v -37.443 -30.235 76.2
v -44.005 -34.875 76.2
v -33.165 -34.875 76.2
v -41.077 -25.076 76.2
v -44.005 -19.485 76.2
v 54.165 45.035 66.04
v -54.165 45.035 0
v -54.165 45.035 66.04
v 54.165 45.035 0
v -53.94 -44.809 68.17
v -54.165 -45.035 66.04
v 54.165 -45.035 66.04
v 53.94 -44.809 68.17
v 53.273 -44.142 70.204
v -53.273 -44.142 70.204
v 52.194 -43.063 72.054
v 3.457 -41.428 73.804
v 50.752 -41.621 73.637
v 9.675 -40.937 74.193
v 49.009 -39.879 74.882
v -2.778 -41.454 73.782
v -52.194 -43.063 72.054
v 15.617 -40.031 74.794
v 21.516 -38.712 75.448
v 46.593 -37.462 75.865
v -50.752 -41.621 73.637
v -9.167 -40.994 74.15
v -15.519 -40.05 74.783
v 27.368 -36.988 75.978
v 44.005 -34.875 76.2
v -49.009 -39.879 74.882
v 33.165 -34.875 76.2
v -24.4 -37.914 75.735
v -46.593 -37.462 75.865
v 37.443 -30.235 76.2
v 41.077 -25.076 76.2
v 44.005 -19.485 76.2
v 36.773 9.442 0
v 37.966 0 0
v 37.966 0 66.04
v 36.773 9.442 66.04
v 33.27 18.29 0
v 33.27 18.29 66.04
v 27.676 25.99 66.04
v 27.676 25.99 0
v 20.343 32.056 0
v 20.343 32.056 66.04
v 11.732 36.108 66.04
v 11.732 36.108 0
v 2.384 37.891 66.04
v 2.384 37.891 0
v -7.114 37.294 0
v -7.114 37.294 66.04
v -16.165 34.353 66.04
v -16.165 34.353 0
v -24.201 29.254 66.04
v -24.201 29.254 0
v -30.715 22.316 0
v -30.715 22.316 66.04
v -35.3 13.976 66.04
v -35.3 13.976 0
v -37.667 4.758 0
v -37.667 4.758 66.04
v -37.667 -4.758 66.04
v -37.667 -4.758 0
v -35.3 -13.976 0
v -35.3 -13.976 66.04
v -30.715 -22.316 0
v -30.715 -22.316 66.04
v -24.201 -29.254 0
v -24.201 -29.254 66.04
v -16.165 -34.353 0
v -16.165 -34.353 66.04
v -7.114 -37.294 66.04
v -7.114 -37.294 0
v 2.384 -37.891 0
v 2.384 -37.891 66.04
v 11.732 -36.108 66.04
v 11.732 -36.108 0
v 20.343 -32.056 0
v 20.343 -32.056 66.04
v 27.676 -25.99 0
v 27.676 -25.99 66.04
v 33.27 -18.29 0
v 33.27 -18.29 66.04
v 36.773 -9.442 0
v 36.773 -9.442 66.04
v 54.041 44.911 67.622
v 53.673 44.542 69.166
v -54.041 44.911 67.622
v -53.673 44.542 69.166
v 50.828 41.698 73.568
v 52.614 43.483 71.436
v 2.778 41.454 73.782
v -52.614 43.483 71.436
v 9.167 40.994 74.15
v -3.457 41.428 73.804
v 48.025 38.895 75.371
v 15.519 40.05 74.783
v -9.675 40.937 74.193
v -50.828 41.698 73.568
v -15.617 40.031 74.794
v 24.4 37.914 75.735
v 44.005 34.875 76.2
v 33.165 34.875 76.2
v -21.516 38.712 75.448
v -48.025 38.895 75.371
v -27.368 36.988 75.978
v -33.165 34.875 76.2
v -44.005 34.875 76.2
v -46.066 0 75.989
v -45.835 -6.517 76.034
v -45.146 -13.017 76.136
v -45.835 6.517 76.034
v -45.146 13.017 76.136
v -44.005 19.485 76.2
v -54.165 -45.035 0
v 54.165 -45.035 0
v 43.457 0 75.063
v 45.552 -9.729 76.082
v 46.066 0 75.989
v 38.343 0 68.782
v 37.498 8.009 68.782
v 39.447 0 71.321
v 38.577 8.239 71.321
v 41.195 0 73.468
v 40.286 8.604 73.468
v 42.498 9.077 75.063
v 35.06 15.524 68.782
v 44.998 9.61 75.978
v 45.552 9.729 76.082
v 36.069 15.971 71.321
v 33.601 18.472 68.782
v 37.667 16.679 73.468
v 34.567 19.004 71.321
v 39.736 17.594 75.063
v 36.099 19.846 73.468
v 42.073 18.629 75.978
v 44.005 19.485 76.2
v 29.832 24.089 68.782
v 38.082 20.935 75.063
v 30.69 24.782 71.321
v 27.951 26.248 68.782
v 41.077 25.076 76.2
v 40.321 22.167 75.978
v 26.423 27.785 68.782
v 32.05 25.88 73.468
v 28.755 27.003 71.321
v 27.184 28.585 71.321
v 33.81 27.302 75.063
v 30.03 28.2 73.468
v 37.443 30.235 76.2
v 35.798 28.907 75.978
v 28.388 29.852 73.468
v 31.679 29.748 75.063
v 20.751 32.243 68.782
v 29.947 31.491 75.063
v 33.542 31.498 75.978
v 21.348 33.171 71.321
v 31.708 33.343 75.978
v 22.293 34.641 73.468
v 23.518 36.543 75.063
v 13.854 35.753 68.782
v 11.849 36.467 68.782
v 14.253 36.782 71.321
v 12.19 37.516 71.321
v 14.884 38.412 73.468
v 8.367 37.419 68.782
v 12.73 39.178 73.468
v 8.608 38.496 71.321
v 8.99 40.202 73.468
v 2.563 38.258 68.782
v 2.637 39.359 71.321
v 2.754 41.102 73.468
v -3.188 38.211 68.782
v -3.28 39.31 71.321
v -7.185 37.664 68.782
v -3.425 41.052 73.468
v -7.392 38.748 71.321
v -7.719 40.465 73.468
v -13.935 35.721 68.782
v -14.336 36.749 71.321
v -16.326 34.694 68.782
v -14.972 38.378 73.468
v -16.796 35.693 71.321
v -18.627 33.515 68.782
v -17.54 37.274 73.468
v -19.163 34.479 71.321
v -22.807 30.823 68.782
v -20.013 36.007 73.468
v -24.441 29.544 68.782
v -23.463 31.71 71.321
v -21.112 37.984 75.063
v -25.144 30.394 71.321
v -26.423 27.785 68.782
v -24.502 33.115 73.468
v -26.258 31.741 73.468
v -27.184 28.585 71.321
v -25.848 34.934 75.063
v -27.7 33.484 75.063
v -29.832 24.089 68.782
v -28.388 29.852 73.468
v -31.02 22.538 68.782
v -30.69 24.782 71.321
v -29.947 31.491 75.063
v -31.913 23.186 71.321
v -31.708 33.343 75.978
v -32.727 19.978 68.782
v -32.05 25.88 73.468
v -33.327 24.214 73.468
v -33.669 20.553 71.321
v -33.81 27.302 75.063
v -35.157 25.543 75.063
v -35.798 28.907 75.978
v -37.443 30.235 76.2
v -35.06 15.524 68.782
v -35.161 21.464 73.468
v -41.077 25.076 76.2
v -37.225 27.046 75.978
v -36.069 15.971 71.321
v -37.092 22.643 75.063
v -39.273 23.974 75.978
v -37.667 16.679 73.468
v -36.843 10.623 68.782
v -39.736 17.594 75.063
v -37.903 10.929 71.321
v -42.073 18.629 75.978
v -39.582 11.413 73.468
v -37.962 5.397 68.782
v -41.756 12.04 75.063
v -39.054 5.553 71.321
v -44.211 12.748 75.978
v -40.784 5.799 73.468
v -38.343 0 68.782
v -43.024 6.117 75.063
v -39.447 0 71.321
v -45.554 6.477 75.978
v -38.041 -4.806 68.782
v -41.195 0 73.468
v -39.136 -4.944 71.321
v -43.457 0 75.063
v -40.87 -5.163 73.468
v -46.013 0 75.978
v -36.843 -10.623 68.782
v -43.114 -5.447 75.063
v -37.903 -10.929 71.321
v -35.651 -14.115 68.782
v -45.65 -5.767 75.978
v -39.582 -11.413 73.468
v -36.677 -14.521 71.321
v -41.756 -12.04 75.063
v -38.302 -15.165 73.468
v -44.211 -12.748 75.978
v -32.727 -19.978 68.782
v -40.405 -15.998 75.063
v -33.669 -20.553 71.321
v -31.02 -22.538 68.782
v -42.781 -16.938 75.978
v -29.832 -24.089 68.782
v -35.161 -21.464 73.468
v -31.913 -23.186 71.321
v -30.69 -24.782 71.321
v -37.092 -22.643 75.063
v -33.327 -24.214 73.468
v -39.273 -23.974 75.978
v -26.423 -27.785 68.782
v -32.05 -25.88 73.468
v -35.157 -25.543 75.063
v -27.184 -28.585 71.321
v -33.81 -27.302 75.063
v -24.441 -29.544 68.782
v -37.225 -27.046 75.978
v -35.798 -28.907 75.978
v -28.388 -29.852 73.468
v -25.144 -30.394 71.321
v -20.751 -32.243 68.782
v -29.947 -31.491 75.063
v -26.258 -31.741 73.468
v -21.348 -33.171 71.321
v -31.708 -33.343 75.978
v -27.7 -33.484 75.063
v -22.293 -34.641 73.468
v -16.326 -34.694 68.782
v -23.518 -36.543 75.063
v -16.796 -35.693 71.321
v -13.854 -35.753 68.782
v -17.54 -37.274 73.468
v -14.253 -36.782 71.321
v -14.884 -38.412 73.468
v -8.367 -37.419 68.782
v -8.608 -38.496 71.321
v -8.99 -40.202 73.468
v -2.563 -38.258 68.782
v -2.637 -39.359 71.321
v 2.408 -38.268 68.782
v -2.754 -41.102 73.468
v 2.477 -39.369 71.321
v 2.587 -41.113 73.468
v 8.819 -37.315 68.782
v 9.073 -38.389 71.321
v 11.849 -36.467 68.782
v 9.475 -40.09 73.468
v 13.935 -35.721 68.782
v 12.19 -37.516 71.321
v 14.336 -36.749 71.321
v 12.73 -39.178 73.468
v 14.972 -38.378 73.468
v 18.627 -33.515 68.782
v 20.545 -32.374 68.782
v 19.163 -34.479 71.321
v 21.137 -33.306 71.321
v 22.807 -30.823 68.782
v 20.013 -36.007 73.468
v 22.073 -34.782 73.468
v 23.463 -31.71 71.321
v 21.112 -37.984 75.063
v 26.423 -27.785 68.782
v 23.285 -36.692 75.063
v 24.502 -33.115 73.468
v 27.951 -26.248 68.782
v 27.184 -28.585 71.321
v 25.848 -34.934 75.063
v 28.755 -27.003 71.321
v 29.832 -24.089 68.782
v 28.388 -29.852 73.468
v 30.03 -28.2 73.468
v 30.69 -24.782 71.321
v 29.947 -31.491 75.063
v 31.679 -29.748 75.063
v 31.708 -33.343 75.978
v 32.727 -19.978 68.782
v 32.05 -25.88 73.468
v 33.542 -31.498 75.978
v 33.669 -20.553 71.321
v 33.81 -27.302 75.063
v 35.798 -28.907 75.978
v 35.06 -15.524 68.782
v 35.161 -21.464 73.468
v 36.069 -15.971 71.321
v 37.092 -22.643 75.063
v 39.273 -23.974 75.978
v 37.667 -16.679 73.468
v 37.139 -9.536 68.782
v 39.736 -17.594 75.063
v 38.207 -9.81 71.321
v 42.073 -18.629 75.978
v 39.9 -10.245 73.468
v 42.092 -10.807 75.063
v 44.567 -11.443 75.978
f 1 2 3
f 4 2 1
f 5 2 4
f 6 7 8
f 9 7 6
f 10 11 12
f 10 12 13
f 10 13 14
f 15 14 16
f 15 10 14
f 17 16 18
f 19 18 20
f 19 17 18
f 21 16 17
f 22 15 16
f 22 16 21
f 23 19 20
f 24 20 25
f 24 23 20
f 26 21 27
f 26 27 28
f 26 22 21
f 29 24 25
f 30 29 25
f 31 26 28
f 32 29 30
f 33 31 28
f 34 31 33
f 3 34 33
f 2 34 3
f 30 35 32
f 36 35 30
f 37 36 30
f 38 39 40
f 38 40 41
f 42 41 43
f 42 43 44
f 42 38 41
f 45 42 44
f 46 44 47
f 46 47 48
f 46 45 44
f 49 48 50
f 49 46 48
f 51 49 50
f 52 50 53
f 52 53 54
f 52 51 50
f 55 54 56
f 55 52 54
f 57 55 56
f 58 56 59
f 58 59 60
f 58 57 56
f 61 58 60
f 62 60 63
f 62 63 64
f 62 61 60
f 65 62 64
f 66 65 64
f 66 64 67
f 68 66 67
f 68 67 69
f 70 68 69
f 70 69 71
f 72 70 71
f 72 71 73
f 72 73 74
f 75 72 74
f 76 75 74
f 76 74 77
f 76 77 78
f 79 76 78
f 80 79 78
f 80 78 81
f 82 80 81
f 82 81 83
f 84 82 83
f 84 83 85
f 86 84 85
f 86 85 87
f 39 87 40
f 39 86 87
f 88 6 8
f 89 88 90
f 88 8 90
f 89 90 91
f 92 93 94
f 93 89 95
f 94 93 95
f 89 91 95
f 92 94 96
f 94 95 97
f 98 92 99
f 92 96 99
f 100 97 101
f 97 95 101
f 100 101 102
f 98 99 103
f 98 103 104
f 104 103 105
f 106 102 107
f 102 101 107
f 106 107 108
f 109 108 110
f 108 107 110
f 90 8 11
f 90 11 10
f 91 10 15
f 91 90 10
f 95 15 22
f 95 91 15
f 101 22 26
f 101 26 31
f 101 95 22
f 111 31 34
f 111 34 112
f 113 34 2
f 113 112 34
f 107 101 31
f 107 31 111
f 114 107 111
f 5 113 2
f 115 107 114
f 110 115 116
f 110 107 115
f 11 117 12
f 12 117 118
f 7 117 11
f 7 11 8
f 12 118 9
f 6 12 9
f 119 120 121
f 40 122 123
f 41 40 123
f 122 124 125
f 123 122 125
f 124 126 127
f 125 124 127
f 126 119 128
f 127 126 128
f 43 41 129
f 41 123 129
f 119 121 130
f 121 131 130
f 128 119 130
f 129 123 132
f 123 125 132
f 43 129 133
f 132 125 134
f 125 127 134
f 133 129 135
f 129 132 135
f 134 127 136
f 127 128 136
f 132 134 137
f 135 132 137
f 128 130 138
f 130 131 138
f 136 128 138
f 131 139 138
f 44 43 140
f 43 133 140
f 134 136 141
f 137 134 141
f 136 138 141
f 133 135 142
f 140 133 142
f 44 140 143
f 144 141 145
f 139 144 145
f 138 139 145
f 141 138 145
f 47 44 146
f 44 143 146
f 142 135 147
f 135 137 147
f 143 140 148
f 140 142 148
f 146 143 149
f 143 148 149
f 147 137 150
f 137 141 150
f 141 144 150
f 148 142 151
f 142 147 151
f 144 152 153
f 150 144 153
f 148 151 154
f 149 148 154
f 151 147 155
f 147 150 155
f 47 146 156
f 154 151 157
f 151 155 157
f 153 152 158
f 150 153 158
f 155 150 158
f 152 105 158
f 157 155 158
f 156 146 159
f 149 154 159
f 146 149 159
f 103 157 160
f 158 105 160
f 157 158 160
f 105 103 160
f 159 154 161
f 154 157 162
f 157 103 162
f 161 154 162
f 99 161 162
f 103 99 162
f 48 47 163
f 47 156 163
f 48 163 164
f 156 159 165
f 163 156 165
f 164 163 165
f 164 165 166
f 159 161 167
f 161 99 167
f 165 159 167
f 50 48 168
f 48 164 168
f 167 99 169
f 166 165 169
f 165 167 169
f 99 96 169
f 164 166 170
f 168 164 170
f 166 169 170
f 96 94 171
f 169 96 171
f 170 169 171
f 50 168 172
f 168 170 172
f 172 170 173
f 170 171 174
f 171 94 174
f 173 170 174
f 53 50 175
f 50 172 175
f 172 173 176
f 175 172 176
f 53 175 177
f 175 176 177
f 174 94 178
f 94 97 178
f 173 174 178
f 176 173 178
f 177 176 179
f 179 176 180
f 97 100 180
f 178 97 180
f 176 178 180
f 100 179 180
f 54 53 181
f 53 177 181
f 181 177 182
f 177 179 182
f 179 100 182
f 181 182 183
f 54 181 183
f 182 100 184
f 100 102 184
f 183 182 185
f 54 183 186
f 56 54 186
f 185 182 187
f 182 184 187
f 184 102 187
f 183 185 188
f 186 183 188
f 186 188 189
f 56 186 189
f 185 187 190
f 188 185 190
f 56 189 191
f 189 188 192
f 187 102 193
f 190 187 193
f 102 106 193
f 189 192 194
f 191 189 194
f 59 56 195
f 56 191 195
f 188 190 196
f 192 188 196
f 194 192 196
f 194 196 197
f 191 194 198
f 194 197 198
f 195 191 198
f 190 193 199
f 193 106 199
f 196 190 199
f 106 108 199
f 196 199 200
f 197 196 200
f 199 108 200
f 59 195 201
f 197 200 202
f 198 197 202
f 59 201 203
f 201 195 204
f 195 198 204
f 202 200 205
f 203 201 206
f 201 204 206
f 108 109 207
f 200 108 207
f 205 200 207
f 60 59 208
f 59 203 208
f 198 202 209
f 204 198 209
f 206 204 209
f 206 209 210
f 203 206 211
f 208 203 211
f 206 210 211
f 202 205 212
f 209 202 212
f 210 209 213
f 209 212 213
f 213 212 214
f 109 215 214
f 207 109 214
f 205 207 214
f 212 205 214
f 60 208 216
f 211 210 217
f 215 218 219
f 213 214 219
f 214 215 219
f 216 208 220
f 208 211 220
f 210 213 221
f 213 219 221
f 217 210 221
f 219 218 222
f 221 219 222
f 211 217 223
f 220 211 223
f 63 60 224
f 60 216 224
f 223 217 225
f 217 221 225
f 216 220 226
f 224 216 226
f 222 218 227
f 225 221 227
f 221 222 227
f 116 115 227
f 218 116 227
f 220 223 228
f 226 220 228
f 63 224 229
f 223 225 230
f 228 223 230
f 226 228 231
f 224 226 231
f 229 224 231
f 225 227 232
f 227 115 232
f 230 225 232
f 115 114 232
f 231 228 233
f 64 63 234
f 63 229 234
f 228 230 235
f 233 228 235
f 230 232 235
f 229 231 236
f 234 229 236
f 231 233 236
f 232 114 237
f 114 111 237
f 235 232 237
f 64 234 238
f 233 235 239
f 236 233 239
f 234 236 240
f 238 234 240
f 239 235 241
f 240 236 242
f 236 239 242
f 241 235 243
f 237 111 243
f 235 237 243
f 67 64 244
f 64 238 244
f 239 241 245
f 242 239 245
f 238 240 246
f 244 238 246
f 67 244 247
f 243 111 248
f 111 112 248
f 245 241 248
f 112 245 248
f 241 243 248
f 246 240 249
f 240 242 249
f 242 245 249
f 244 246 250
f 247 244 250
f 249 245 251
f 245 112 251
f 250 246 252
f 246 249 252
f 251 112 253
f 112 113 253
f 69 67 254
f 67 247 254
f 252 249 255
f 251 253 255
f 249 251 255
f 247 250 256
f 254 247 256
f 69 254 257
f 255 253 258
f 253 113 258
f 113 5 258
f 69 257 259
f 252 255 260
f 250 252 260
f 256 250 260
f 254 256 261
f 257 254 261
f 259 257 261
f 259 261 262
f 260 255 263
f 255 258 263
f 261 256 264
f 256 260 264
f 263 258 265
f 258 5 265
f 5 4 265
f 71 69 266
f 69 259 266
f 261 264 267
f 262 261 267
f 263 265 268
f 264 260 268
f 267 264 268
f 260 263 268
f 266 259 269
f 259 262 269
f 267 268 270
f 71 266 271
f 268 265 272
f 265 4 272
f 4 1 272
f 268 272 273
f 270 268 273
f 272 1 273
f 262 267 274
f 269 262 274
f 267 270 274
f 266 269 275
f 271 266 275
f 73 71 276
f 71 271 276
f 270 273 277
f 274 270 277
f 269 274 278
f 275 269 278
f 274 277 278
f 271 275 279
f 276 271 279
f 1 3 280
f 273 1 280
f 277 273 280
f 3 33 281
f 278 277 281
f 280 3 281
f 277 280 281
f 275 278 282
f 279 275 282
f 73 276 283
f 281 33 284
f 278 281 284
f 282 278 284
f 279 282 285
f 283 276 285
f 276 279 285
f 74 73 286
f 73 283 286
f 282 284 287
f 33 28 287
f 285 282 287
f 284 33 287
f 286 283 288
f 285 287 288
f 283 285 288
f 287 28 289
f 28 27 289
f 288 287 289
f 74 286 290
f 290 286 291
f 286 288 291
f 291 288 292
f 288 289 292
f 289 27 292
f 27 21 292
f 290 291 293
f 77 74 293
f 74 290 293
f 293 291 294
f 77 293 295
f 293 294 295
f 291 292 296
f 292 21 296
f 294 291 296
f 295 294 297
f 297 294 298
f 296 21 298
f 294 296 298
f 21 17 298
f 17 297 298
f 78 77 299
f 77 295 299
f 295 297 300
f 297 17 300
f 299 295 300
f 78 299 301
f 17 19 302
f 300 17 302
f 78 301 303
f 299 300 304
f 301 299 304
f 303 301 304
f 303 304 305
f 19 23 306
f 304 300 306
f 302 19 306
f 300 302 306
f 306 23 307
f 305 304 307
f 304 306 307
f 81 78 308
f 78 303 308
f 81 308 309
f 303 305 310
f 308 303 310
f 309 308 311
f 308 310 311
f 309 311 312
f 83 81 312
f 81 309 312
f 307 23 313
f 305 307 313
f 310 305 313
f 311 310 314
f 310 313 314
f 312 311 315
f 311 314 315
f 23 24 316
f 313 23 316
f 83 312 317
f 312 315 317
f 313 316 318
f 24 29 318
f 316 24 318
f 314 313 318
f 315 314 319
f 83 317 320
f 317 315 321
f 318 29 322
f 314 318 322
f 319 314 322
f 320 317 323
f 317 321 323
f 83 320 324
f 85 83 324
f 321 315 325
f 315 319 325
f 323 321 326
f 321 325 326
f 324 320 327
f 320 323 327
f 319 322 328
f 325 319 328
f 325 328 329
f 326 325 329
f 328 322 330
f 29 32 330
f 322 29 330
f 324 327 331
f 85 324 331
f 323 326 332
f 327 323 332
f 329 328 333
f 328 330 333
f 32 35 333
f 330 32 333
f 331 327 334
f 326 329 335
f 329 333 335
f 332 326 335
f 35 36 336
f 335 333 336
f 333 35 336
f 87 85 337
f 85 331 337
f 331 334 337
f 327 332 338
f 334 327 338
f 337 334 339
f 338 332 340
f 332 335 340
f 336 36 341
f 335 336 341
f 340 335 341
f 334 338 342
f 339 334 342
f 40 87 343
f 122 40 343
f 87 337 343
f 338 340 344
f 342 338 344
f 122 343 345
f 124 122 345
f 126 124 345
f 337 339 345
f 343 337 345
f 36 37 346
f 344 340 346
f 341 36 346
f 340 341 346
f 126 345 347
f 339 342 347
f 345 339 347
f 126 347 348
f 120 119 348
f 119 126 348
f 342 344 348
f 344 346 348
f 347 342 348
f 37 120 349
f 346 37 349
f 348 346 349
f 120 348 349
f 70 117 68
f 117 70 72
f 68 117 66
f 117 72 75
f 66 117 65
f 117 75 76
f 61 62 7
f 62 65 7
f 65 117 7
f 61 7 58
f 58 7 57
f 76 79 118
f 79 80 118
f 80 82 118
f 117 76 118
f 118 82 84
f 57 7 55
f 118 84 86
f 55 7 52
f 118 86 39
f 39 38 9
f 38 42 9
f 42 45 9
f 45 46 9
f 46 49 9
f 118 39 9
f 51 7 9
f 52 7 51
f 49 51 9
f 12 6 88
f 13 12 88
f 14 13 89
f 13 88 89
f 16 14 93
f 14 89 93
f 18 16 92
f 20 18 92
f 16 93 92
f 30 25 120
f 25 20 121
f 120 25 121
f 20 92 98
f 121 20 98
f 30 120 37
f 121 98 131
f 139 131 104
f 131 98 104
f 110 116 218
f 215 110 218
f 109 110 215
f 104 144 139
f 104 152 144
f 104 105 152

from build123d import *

# Parameters (mm, degrees)
F0_W        = 108.3307564259
F0_H        = 90.0692865252
F0_R        = 37.9662670308
F1_DEPTH    = 76.2
F2_T1_DEPTH = 159.1307564259
F2_T3_DEPTH = 140.8692865252


# Not quite as in the source:
# - a fillet or chamfer that OpenCascade refuses, or shapes differently, is made with other operations: its cross-section is extruded or revolved along the edge and cut away or added


with BuildPart() as f1:
    # F0 (on Top) → F1 (new body)
    with BuildSketch(Plane.XY):
        Rectangle(F0_W, F0_H)
        Circle(F0_R, mode=Mode.SUBTRACT)
    extrude(amount=F1_DEPTH)

    # F2: fillet of radius 10.16 on 5 edges, made by hand

    # F2_s2 → F2_t1 (cut)
    with BuildSketch(Plane.YZ.offset(-79.5653782129)):
        with BuildLine():
            ThreePointArc((-45.0346432626, 66.04), (-42.0588481595, 73.2242048969), (-34.8746432626, 76.2))
            Line((-34.8746432626, 76.2), (-45.0346432626, 76.2))
            Line((-45.0346432626, 76.2), (-45.0346432626, 66.04))
        make_face()
        with BuildLine():
            ThreePointArc((45.0346432626, 66.04), (42.0588481595, 73.2242048969), (34.8746432626, 76.2))
            Line((34.8746432626, 76.2), (45.0346432626, 76.2))
            Line((45.0346432626, 76.2), (45.0346432626, 66.04))
        make_face()
    extrude(amount=F2_T1_DEPTH, mode=Mode.SUBTRACT)

    # F2_s4 → F2_t3 (cut)
    with BuildSketch(Plane.XZ.offset(-70.4346432626)):
        with BuildLine():
            ThreePointArc((-54.1653782129, 66.04), (-51.1895831098, 73.2242048969), (-44.0053782129, 76.2))
            Line((-44.0053782129, 76.2), (-54.1653782129, 76.2))
            Line((-54.1653782129, 76.2), (-54.1653782129, 66.04))
        make_face()
        with BuildLine():
            ThreePointArc((54.1653782129, 66.04), (51.1895831098, 73.2242048969), (44.0053782129, 76.2))
            Line((44.0053782129, 76.2), (54.1653782129, 76.2))
            Line((54.1653782129, 76.2), (54.1653782129, 66.04))
        make_face()
    extrude(amount=F2_T3_DEPTH, mode=Mode.SUBTRACT)

    # F2_s5 → F2_t6 (revolve, cut)
    with BuildSketch(Plane.XZ):
        with BuildLine():
            ThreePointArc((37.9662670308, 66.04), (40.9420621339, 73.2242048969), (48.1262670308, 76.2))
            Line((48.1262670308, 76.2), (37.9662670308, 76.2))
            Line((37.9662670308, 76.2), (37.9662670308, 66.04))
        make_face()
    revolve(axis=Axis((0, 0, 76.2), (0, 0, 1)), mode=Mode.SUBTRACT)


solid = f1.part
